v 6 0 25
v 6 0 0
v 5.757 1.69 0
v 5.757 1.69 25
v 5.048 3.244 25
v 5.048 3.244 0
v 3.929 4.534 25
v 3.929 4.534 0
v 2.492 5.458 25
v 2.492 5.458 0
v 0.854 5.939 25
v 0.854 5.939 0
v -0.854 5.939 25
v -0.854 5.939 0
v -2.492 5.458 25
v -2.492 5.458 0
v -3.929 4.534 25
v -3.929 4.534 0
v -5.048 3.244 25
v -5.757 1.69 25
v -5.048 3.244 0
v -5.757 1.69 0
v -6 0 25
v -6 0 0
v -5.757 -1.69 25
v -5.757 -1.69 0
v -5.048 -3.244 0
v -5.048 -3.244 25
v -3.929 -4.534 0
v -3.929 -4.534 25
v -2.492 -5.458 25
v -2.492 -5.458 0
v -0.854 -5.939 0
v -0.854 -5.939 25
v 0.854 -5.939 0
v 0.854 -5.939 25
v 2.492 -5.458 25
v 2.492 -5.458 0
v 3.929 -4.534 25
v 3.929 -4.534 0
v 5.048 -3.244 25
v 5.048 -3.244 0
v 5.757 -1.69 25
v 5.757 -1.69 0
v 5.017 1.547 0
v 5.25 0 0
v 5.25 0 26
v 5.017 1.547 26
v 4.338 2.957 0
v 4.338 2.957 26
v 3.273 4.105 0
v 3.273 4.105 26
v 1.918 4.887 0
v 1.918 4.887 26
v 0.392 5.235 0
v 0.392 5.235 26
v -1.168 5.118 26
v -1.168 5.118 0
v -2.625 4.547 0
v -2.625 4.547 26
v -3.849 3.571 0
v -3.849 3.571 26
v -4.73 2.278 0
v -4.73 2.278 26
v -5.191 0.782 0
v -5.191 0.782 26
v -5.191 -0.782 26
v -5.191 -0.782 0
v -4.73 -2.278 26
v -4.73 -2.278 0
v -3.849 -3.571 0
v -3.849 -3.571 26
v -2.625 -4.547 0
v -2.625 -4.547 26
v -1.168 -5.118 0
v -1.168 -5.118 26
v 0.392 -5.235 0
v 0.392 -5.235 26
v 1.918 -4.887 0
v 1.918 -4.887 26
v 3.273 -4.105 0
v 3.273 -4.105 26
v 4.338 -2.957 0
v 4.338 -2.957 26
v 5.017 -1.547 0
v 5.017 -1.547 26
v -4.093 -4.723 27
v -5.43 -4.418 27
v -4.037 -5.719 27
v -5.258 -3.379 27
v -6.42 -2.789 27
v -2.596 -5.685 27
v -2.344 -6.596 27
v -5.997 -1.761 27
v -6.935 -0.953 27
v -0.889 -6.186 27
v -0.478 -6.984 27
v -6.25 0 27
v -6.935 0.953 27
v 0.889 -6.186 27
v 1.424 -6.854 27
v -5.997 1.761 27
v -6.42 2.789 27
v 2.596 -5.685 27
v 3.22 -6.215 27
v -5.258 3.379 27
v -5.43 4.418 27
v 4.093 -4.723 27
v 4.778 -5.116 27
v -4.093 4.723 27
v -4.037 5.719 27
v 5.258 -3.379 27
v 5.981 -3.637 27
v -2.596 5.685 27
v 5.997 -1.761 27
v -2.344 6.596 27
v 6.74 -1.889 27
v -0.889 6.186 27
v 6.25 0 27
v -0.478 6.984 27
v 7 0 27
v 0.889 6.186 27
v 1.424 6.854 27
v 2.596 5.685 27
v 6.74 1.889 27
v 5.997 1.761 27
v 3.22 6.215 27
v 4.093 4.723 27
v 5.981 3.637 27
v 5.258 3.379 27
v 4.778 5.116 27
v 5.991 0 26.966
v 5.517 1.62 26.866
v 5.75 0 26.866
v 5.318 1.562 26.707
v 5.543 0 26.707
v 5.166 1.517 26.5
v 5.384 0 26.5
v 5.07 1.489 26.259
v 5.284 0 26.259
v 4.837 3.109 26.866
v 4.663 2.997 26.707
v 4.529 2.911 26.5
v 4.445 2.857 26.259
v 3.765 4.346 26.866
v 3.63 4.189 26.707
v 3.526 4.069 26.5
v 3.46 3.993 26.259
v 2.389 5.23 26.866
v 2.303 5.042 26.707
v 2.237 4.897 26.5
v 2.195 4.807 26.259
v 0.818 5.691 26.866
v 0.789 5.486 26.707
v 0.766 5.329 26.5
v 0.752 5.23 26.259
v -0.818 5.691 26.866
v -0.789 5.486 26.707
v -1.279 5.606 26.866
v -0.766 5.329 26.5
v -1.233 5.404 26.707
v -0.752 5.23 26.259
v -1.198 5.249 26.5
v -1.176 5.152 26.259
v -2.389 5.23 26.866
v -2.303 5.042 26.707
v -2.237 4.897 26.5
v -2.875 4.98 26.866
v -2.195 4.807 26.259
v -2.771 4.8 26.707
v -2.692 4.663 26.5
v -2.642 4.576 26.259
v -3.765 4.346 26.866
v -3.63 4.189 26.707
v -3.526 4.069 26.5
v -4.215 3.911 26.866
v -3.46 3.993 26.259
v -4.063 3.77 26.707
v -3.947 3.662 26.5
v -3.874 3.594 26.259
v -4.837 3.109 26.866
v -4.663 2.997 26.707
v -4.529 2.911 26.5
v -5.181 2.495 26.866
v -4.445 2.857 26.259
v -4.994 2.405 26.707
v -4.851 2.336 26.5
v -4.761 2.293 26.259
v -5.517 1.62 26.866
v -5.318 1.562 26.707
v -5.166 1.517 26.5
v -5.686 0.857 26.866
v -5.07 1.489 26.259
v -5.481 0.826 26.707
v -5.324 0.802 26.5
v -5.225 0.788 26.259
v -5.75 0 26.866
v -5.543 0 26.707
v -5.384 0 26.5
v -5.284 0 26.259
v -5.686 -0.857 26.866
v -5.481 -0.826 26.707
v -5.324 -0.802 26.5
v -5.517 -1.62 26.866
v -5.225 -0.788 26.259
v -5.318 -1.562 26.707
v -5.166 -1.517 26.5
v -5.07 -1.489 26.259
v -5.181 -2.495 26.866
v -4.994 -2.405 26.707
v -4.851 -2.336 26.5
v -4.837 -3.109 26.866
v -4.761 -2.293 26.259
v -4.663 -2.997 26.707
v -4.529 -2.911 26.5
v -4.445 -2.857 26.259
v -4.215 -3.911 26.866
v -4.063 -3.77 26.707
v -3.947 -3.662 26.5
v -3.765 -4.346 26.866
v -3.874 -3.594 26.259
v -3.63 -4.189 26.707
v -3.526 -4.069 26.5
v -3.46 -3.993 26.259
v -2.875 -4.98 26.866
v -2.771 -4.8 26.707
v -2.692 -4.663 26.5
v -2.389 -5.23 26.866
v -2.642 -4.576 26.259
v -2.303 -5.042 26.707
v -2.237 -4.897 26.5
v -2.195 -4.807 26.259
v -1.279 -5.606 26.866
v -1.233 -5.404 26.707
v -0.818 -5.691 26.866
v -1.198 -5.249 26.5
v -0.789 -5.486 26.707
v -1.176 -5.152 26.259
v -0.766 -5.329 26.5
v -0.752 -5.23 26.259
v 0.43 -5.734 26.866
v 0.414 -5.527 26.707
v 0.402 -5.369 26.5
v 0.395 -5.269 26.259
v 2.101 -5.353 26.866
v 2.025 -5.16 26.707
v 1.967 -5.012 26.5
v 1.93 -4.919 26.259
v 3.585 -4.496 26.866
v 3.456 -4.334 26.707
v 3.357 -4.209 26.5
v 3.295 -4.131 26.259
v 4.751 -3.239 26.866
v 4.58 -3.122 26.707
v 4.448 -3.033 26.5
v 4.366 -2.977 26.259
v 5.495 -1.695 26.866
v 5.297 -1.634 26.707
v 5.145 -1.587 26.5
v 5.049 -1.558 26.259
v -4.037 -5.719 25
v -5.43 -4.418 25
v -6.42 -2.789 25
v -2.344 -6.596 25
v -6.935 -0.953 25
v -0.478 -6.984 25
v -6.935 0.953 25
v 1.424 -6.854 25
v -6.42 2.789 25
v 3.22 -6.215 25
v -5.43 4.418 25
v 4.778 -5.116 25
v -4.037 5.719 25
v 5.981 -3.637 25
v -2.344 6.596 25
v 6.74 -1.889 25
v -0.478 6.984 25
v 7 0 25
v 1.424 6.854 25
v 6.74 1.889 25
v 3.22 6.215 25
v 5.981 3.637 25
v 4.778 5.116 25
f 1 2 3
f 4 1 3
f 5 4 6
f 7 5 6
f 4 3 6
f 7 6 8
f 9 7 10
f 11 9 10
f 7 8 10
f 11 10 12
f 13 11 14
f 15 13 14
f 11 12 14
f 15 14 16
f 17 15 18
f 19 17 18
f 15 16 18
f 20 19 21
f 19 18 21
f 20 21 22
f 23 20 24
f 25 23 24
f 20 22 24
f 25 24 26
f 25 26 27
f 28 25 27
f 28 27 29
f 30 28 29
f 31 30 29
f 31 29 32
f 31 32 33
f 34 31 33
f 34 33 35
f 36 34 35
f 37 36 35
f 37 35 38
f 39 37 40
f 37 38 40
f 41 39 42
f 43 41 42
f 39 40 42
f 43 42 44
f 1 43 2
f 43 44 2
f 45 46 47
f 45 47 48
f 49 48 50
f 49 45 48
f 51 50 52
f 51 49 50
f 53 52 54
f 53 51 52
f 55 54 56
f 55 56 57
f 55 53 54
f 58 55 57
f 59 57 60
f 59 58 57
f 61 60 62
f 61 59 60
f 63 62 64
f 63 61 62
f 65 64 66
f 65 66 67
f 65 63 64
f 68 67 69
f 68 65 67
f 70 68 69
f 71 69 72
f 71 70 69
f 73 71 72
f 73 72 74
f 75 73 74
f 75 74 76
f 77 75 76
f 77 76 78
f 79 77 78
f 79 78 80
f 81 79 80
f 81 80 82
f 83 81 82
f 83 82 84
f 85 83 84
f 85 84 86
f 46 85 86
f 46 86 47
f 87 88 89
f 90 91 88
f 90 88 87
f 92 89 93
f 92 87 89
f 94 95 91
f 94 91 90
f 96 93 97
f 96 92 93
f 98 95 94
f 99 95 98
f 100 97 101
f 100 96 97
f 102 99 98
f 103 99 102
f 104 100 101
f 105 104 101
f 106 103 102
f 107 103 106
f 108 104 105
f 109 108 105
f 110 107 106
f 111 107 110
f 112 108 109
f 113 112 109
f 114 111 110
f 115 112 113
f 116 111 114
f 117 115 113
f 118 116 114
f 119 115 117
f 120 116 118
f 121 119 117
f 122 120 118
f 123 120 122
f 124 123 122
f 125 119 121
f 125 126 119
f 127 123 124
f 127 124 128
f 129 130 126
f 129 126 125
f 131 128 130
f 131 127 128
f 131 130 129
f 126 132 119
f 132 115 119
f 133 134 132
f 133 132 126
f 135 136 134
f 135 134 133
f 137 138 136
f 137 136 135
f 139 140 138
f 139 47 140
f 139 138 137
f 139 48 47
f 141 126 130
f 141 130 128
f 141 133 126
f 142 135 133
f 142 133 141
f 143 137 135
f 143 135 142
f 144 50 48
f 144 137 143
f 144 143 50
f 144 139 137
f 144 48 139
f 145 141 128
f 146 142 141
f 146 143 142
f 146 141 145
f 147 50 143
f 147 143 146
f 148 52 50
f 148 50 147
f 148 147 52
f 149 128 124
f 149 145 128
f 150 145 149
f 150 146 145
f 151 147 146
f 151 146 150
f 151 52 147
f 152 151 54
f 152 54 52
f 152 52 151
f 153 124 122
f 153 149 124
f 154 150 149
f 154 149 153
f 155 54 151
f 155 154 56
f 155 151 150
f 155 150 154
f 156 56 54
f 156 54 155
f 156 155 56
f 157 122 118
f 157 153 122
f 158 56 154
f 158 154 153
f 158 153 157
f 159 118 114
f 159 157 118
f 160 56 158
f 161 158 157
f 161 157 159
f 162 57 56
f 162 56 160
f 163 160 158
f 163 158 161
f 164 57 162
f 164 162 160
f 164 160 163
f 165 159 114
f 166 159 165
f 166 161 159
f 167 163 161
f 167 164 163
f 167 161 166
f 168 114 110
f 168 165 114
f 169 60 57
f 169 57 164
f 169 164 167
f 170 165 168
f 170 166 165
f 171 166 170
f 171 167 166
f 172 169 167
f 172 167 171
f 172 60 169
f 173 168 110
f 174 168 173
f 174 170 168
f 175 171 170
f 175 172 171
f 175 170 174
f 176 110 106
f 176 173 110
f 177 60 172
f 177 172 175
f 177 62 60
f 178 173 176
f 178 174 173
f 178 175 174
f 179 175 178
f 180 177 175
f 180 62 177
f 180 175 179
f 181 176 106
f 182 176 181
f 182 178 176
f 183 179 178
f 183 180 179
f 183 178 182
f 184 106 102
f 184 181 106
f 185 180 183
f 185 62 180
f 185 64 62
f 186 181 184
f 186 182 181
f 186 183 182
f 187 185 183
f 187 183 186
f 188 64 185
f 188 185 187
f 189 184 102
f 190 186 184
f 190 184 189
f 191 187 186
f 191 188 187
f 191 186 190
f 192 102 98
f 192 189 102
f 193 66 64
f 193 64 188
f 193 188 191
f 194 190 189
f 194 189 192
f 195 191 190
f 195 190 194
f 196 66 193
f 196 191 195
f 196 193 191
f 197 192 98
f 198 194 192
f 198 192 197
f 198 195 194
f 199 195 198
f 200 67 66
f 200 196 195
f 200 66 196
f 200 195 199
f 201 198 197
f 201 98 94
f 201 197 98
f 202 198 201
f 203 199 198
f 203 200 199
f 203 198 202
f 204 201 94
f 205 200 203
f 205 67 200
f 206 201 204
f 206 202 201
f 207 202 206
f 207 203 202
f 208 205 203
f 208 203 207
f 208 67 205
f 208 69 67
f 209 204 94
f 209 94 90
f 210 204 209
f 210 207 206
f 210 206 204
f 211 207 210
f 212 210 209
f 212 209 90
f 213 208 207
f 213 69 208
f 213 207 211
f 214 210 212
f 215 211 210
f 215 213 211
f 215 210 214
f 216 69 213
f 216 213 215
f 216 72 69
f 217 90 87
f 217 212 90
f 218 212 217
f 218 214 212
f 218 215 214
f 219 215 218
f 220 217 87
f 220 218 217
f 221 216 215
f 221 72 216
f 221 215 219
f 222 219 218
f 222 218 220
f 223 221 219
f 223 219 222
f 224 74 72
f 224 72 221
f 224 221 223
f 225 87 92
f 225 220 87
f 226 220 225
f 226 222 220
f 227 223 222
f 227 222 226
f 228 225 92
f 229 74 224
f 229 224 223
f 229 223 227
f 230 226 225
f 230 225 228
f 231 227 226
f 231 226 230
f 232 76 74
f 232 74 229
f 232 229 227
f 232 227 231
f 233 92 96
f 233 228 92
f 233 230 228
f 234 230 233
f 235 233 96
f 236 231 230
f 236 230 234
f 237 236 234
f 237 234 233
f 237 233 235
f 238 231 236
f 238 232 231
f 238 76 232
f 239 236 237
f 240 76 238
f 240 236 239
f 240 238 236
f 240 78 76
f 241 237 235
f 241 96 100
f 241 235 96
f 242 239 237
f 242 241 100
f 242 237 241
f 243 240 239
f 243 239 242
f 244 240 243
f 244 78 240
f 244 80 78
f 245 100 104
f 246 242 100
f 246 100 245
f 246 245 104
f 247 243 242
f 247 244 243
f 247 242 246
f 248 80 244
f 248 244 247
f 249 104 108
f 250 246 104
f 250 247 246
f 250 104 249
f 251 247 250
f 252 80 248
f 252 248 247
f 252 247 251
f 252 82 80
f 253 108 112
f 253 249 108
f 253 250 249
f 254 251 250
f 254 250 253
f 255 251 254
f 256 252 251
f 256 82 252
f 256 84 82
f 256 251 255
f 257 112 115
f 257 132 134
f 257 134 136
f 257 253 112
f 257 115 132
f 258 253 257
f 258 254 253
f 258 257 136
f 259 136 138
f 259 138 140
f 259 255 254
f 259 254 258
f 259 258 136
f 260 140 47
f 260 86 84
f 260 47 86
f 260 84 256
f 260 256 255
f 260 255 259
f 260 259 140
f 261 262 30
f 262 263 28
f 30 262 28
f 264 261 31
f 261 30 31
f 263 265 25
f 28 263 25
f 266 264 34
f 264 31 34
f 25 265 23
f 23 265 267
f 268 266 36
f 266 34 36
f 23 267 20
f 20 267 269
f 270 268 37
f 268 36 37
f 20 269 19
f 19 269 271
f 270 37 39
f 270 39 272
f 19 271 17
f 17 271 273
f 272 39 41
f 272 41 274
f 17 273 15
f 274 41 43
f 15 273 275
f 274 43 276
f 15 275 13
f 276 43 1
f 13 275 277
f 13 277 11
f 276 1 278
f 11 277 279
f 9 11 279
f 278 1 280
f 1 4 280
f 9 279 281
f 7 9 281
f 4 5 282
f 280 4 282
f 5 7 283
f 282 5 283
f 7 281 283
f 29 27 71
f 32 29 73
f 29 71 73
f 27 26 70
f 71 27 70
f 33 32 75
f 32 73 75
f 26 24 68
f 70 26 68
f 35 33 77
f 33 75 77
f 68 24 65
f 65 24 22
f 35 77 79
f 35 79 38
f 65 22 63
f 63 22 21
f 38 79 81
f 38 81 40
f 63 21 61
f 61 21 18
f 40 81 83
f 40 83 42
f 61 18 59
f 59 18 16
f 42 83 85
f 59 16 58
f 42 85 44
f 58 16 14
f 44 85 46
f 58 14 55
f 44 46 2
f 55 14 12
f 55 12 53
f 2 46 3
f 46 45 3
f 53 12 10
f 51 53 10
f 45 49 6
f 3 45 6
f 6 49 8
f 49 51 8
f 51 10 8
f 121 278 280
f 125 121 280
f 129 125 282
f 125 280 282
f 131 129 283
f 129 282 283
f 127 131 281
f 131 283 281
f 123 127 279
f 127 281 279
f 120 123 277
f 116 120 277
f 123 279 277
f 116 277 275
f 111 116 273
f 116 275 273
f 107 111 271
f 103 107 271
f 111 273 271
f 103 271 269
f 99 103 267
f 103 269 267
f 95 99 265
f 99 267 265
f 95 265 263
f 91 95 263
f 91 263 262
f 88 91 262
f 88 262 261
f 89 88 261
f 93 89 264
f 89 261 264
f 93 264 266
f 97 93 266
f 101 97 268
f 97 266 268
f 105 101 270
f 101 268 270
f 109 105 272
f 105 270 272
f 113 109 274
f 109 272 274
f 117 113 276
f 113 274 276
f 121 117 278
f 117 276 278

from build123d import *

# Parameters (mm, degrees)
SKETCH_R      = 6
SKETCH_R_2    = 5.25
PAD_DEPTH     = 25
SKETCH001_R   = 7
SKETCH001_R_2 = 5.25
PAD001_DEPTH  = 2
FILLET_R      = 1


with BuildPart() as part:
    # Sketch → Pad (new body)
    with BuildSketch(Plane.XY):
        Circle(SKETCH_R)
        Circle(SKETCH_R_2, mode=Mode.SUBTRACT)
    extrude(amount=PAD_DEPTH)

    # Sketch001 (on Face4 of Pad) → Pad001 (join)
    with BuildSketch(Plane.XY.offset(25)):
        Circle(SKETCH001_R)
        Circle(SKETCH001_R_2, mode=Mode.SUBTRACT)
    extrude(amount=PAD001_DEPTH)

    # Fillet
    fillet_edges = [part.edges().sort_by_distance(p)[0] for p in [
        (-5.25, 0, 27),
    ]]
    fillet(fillet_edges, radius=FILLET_R)


solid = part.part
